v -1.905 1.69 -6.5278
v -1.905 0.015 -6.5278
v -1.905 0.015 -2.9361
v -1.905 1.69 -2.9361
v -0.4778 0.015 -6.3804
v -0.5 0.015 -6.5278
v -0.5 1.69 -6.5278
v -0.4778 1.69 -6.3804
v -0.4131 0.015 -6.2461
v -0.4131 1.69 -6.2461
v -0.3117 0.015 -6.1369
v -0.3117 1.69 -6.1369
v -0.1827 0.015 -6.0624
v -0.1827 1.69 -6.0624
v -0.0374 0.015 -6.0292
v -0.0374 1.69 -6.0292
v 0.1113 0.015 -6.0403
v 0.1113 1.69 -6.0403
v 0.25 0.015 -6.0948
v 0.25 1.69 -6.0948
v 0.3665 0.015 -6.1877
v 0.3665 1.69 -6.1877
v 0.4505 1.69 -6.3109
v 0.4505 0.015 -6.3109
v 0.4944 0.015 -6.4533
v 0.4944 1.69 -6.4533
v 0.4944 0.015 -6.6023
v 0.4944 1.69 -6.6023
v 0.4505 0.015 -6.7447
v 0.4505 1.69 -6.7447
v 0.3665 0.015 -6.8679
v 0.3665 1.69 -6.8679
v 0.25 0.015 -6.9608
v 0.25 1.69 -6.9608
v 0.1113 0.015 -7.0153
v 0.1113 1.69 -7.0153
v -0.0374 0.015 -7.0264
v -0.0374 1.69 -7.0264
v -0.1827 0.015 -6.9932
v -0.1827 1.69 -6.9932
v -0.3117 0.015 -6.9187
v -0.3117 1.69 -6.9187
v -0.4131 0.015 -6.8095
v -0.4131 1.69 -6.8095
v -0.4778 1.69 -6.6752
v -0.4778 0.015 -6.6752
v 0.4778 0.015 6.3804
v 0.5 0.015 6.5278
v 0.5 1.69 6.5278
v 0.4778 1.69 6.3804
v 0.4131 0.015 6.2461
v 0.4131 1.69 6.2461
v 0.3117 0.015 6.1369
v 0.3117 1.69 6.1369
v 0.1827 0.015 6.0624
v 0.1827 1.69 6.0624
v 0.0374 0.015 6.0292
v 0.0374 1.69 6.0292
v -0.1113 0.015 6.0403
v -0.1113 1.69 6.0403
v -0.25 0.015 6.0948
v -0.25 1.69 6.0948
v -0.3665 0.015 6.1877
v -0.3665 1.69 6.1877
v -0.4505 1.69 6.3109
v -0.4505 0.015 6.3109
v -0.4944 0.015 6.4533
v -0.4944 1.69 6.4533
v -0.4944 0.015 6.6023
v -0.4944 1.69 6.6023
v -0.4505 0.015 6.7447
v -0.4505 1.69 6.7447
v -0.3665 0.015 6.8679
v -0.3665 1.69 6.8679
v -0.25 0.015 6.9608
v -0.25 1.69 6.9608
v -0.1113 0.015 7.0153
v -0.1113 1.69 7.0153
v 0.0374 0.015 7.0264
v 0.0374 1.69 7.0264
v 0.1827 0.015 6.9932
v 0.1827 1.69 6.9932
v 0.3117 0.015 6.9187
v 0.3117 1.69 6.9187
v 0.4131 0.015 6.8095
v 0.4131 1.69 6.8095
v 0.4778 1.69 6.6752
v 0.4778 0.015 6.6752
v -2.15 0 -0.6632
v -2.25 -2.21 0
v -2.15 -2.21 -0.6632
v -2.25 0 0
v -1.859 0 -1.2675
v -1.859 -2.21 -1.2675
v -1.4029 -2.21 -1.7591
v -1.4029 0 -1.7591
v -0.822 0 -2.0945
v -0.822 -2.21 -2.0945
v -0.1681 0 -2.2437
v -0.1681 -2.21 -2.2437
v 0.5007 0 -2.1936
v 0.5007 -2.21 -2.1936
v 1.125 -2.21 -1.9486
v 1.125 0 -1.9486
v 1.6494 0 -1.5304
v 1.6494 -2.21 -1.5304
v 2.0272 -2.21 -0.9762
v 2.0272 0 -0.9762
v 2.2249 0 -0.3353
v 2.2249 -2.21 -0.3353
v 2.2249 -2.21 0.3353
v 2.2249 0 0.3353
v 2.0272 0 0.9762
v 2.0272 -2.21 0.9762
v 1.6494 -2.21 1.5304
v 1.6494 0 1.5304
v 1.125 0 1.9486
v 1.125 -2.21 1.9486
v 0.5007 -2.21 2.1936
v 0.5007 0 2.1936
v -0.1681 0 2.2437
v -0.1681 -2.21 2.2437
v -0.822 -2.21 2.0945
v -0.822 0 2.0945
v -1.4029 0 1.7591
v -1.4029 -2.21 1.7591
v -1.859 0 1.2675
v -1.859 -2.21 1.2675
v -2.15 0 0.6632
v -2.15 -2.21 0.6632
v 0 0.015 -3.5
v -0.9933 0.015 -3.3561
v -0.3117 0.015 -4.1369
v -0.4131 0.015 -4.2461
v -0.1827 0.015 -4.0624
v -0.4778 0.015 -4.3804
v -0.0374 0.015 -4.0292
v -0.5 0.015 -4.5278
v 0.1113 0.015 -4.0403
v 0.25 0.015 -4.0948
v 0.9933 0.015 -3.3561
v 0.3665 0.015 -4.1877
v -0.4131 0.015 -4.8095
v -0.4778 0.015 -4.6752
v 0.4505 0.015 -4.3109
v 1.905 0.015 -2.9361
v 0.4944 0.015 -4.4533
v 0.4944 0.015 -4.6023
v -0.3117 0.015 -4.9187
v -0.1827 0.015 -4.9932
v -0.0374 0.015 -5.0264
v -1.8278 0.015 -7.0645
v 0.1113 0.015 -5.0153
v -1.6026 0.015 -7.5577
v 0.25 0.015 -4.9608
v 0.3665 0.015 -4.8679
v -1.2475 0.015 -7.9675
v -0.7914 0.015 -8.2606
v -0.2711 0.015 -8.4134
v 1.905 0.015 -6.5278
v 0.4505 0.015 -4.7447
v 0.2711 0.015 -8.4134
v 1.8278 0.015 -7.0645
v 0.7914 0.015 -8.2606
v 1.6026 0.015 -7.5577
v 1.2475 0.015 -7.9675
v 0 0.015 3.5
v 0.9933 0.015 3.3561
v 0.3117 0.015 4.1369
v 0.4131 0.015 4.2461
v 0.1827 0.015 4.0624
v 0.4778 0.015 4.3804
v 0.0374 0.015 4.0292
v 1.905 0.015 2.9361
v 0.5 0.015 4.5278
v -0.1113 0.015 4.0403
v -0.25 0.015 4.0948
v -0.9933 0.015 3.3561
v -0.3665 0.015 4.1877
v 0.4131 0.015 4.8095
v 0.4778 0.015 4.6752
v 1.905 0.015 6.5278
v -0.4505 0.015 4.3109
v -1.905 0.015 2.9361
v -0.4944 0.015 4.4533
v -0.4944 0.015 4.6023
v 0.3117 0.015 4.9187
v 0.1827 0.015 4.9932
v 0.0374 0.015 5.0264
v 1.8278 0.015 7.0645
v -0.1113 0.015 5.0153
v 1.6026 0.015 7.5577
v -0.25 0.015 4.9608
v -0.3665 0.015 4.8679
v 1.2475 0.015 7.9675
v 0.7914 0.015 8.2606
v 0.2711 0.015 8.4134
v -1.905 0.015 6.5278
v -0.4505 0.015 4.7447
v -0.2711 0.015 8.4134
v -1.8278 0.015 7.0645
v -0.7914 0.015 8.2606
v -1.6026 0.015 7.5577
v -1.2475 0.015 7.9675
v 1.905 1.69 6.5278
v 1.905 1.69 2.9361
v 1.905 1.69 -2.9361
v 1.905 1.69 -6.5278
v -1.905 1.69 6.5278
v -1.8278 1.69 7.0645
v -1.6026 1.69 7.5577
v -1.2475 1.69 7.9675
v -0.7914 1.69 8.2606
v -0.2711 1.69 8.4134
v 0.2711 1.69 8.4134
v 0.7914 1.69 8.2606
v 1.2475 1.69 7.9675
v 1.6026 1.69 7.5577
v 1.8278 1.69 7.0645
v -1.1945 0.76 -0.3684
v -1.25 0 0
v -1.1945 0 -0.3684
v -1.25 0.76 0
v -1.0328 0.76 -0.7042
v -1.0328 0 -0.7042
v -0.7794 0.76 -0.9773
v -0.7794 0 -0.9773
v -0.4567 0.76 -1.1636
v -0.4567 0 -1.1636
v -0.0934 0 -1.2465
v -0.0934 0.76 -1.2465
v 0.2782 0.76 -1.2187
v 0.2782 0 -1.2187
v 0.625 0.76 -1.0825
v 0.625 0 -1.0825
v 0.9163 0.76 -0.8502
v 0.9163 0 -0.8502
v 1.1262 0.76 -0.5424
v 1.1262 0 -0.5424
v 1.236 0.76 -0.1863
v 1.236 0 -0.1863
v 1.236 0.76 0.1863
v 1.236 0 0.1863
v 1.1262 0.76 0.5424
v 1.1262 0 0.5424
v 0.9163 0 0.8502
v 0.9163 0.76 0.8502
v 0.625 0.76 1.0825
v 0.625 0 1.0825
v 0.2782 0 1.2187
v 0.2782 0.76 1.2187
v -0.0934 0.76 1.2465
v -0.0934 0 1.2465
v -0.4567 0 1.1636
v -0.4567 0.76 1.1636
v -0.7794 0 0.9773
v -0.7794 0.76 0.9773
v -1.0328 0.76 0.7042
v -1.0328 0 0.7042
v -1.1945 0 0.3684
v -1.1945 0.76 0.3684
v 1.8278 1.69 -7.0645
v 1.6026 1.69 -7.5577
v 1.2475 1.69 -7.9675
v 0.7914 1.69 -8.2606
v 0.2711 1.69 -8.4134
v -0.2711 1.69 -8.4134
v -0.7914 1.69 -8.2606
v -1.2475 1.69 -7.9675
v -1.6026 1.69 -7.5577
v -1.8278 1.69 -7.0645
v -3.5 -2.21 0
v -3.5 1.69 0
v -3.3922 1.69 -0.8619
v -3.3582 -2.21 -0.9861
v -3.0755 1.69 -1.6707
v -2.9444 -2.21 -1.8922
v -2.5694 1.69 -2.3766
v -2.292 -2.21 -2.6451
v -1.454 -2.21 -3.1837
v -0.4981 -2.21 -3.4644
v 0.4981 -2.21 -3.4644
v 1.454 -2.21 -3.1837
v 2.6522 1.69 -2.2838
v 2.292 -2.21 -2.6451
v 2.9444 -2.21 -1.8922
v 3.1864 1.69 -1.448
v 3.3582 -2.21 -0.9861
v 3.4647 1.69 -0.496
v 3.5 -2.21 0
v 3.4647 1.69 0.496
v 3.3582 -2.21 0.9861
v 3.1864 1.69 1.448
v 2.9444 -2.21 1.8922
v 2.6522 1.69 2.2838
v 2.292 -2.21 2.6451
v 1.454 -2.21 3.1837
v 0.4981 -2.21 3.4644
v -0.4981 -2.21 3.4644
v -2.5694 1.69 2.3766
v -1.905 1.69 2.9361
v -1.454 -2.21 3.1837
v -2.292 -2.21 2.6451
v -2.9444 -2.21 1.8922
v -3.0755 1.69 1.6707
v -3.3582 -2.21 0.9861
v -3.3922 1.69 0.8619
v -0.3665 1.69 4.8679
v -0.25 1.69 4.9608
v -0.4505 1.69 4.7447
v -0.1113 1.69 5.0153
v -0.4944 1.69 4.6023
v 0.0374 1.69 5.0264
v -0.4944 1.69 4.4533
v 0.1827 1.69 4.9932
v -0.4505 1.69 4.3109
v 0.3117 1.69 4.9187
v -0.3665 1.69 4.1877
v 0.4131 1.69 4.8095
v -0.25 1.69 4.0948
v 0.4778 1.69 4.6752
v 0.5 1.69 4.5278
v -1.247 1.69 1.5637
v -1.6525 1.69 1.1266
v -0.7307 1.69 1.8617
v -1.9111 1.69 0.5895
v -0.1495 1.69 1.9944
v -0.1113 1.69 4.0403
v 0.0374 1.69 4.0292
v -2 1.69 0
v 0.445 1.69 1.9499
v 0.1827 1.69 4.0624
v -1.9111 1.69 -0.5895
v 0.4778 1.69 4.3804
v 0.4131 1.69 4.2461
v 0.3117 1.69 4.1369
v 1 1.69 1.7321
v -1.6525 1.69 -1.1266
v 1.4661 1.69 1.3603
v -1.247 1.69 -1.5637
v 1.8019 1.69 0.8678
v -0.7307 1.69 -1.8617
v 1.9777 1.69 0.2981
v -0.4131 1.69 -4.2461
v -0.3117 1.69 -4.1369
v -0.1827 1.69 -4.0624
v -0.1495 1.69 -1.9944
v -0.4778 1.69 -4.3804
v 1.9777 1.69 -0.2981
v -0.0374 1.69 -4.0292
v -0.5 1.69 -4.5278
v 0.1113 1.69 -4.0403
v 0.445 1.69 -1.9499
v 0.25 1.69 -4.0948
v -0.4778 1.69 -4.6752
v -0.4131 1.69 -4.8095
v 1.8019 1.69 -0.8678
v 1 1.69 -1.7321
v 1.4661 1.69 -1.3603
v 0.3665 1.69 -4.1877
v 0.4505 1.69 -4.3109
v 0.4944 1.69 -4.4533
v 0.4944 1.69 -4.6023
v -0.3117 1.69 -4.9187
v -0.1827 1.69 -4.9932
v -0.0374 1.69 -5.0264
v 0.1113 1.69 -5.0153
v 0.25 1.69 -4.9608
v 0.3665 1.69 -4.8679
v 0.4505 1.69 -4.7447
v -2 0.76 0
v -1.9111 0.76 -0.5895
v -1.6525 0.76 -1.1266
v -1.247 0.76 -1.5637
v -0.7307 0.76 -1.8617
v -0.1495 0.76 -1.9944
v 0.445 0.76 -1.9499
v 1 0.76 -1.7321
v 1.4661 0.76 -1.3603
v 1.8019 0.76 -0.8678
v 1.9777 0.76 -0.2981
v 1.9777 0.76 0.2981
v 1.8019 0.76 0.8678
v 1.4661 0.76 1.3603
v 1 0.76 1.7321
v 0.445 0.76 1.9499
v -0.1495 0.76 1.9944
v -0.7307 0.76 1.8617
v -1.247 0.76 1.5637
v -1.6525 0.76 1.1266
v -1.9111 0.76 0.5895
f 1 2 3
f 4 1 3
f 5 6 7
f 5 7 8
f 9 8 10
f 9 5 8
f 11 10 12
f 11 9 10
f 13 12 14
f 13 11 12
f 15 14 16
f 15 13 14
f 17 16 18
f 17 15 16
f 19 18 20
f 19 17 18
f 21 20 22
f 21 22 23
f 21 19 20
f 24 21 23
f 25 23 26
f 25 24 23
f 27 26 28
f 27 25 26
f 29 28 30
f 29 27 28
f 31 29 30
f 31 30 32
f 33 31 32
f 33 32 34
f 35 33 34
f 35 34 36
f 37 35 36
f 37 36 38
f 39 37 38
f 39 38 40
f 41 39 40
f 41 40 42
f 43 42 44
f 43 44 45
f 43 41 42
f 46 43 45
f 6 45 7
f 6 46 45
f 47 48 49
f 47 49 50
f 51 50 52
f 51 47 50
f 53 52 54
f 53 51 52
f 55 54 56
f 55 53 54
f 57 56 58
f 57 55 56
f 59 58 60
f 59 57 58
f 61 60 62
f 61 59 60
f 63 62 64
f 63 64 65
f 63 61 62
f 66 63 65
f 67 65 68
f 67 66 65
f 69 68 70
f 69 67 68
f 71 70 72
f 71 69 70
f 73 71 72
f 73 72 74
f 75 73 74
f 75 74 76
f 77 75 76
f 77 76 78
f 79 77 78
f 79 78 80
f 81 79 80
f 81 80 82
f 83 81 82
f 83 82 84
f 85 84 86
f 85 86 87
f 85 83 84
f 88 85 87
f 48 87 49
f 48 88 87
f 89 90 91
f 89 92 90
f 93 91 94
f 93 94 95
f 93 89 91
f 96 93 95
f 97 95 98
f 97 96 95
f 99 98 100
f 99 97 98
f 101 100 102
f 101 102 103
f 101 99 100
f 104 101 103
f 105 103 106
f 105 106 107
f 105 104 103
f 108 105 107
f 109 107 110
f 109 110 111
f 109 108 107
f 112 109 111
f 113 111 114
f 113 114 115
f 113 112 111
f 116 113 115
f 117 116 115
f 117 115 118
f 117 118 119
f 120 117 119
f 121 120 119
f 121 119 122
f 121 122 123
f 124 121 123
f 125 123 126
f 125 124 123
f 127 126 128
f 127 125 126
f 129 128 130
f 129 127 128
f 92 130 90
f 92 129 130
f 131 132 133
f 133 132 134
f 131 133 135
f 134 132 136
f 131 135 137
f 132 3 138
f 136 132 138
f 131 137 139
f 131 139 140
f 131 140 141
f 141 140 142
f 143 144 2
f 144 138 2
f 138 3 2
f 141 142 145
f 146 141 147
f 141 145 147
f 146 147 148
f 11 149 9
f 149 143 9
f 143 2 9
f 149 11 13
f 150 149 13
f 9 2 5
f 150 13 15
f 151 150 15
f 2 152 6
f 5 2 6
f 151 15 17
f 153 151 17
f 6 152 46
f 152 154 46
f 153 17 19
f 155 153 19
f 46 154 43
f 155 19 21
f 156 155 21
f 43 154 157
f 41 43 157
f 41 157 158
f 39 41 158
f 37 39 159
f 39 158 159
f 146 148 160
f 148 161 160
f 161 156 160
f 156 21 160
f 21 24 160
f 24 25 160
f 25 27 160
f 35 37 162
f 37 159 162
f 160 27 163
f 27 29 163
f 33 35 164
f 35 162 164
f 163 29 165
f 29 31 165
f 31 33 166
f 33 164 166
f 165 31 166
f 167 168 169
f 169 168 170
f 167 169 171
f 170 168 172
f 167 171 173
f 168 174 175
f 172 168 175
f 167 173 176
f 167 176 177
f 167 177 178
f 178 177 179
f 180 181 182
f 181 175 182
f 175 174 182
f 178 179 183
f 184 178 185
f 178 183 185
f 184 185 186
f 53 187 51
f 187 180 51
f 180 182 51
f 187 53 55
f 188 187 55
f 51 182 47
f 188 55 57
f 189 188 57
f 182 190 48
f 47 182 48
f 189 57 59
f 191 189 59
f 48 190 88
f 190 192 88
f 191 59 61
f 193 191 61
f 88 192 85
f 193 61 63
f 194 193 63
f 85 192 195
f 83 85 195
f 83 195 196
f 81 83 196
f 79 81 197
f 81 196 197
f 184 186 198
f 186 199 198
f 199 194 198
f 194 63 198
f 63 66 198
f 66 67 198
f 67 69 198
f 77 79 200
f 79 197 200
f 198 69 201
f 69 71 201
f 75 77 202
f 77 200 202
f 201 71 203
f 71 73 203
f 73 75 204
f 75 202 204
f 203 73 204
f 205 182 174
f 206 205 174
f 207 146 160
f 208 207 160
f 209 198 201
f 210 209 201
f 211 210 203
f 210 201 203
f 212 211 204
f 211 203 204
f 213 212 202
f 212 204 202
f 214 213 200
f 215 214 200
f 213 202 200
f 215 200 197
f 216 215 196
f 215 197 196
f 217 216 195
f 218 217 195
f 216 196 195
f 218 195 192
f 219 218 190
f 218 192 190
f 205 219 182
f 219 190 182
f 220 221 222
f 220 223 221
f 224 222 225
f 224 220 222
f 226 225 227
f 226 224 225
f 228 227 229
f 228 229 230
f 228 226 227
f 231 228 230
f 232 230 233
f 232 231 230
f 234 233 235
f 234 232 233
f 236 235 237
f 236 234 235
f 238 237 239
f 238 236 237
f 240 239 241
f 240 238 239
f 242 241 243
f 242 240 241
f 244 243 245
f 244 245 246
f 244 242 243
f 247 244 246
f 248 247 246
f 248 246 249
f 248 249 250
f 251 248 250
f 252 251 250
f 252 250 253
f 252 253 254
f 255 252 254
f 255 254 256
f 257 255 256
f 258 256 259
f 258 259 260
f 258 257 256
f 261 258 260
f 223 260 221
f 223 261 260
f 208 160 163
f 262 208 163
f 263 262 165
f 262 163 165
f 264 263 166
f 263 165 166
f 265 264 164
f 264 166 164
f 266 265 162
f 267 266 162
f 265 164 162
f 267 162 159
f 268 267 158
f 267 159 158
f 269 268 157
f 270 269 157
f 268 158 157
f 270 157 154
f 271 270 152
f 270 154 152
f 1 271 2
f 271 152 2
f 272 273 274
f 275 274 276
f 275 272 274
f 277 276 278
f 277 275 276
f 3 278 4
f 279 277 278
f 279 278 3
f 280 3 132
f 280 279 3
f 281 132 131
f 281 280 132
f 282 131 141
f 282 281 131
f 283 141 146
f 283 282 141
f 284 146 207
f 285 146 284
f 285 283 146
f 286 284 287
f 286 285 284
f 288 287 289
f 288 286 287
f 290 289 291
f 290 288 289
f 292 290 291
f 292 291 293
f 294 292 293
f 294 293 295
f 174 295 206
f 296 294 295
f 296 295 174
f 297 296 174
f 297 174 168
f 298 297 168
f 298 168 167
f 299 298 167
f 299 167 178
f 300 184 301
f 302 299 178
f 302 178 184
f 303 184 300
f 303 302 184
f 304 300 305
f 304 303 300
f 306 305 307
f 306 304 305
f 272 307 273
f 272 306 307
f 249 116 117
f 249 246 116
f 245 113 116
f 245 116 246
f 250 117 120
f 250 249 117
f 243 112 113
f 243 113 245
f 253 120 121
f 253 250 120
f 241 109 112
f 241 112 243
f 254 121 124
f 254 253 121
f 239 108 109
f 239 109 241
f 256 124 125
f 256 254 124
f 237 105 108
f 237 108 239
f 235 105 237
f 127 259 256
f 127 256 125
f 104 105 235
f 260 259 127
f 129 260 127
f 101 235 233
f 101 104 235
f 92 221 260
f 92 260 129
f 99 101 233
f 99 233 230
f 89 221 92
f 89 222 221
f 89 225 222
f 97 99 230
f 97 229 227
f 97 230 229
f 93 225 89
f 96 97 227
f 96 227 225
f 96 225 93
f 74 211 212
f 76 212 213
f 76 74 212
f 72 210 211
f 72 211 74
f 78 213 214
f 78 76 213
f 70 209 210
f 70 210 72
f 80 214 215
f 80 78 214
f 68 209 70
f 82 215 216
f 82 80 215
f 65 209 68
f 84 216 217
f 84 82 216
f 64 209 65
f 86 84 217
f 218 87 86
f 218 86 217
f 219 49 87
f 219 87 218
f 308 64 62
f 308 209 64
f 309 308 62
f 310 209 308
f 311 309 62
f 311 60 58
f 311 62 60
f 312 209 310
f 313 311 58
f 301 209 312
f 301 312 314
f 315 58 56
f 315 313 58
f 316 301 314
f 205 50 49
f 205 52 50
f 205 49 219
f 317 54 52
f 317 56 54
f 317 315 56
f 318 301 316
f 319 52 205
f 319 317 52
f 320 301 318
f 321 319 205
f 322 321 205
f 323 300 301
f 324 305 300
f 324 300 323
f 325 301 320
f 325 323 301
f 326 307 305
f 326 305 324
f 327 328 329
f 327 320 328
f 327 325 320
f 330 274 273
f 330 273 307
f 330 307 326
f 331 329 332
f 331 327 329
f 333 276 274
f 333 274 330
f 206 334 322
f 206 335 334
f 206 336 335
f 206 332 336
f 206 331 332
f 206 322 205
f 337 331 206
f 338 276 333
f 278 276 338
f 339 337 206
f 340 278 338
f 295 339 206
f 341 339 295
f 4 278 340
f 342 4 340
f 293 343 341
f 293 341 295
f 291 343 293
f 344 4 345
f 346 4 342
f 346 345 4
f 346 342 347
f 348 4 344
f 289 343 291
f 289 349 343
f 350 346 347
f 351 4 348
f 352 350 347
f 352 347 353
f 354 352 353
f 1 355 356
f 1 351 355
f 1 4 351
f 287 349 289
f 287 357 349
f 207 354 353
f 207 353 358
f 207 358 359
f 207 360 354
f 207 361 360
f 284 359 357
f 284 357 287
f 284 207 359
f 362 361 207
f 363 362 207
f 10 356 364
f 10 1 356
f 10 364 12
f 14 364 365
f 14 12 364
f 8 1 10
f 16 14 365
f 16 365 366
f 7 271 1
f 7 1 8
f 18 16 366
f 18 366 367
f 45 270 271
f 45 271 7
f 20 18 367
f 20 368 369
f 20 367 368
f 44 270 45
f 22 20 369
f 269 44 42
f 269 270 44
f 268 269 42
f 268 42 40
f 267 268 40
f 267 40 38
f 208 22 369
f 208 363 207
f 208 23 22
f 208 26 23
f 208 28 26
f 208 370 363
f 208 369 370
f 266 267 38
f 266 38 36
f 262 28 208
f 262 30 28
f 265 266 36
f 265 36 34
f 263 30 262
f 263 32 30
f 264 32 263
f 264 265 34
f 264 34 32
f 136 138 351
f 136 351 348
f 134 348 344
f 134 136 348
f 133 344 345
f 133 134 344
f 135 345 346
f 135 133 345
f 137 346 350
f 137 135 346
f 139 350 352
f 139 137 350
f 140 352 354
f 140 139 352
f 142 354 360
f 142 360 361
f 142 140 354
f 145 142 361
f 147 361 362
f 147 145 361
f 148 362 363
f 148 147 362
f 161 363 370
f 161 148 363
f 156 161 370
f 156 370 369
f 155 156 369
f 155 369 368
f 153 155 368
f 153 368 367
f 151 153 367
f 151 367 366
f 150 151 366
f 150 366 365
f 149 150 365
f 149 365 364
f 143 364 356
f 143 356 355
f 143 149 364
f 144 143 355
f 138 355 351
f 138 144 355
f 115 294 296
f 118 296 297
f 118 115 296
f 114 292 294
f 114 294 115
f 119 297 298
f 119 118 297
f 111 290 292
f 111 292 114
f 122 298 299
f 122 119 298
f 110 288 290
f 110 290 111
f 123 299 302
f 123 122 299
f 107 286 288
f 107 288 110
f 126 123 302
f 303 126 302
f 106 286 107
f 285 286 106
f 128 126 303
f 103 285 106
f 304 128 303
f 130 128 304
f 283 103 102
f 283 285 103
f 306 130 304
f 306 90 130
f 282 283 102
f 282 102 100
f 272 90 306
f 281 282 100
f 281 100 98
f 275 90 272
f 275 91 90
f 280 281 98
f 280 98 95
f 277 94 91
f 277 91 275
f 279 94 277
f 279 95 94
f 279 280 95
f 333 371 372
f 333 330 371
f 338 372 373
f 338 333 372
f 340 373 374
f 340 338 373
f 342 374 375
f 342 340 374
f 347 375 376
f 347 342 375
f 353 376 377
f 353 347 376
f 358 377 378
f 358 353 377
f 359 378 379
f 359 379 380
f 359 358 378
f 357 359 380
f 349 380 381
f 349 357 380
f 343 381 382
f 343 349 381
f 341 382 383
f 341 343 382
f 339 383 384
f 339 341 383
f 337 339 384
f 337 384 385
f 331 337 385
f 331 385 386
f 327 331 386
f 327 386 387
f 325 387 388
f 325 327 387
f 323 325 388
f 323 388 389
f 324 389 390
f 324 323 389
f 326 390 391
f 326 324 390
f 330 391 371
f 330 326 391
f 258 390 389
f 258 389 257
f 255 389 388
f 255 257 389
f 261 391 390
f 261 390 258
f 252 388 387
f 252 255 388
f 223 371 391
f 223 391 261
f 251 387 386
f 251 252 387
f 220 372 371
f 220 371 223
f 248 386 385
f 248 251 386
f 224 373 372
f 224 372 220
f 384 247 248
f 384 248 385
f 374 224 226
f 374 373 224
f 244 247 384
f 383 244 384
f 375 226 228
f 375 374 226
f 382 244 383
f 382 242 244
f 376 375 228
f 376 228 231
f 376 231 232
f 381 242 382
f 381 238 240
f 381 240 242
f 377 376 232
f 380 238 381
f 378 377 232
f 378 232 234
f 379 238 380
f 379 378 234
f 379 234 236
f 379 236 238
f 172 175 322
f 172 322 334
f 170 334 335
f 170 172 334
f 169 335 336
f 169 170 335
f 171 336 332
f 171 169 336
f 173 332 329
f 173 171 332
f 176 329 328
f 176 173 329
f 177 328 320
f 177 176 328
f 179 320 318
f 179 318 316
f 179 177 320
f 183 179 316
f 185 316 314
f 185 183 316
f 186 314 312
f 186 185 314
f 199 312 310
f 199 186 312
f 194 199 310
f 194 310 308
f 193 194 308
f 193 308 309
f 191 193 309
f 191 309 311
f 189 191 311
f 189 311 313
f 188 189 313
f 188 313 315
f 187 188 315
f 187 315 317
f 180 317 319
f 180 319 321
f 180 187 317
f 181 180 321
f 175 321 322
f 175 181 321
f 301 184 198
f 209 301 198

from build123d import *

# Parameters (mm, degrees)
BOSS_EXTRUDE1_START = -1.675
SKETCH2_R           = 0.5
BOSS_EXTRUDE1_DEPTH = 1.675
CIRPATTERN1_COUNT   = 2


with BuildPart() as part:
    # Sketch1 → Revolve1 (revolve)
    with BuildSketch(Plane.XY, mode=Mode.PRIVATE) as revolve1_sk:
        Polygon((2.25, 0), (1.25, 0), (1.25, 0.76), (2, 0.76), (2, 1.69), (3.5, 1.69), (3.5, -2.21), (2.25, -2.21), align=None)
    revolve(revolve1_sk.sketch.rotate(Axis((0, 0, 0), (0, -1, 0)), 180), axis=Axis((0, 0, 0), (0, -1, 0)))

    # Sketch2 → Boss-Extrude1 (add)
    with BuildSketch(Plane(origin=(0, 1.69, 0), x_dir=(1, 0, 0), z_dir=(0, 1, 0)).offset(BOSS_EXTRUDE1_START)):
        with BuildLine():
            Line((-1.905, 6.5278), (-1.905, 2.93614969))
            ThreePointArc((-1.905, 2.93614969), (0, 3.5), (1.905, 2.93614969))
            Line((1.905, 2.93614969), (1.905, 6.5278))
            ThreePointArc((1.905, 6.5278), (0, 8.4328), (-1.905, 6.5278))
        make_face()
        with Locations(Location((0, 6.5278, 0), (0, 0, 180))):
            Circle(SKETCH2_R, mode=Mode.SUBTRACT)
        with Locations(Location((0, 4.5278, 0), (0, 0, 180))):
            Circle(SKETCH2_R, mode=Mode.SUBTRACT)
    boss_extrude1 = extrude(amount=BOSS_EXTRUDE1_DEPTH)

    # CirPattern1: Boss-Extrude1 ×2 about axis
    cirpattern1_axis = Axis((0, 0, 0), (0, 1, 0))
    for i in range(1, CIRPATTERN1_COUNT):
        add(boss_extrude1.rotate(cirpattern1_axis, i * 360 / CIRPATTERN1_COUNT))


solid = part.part
